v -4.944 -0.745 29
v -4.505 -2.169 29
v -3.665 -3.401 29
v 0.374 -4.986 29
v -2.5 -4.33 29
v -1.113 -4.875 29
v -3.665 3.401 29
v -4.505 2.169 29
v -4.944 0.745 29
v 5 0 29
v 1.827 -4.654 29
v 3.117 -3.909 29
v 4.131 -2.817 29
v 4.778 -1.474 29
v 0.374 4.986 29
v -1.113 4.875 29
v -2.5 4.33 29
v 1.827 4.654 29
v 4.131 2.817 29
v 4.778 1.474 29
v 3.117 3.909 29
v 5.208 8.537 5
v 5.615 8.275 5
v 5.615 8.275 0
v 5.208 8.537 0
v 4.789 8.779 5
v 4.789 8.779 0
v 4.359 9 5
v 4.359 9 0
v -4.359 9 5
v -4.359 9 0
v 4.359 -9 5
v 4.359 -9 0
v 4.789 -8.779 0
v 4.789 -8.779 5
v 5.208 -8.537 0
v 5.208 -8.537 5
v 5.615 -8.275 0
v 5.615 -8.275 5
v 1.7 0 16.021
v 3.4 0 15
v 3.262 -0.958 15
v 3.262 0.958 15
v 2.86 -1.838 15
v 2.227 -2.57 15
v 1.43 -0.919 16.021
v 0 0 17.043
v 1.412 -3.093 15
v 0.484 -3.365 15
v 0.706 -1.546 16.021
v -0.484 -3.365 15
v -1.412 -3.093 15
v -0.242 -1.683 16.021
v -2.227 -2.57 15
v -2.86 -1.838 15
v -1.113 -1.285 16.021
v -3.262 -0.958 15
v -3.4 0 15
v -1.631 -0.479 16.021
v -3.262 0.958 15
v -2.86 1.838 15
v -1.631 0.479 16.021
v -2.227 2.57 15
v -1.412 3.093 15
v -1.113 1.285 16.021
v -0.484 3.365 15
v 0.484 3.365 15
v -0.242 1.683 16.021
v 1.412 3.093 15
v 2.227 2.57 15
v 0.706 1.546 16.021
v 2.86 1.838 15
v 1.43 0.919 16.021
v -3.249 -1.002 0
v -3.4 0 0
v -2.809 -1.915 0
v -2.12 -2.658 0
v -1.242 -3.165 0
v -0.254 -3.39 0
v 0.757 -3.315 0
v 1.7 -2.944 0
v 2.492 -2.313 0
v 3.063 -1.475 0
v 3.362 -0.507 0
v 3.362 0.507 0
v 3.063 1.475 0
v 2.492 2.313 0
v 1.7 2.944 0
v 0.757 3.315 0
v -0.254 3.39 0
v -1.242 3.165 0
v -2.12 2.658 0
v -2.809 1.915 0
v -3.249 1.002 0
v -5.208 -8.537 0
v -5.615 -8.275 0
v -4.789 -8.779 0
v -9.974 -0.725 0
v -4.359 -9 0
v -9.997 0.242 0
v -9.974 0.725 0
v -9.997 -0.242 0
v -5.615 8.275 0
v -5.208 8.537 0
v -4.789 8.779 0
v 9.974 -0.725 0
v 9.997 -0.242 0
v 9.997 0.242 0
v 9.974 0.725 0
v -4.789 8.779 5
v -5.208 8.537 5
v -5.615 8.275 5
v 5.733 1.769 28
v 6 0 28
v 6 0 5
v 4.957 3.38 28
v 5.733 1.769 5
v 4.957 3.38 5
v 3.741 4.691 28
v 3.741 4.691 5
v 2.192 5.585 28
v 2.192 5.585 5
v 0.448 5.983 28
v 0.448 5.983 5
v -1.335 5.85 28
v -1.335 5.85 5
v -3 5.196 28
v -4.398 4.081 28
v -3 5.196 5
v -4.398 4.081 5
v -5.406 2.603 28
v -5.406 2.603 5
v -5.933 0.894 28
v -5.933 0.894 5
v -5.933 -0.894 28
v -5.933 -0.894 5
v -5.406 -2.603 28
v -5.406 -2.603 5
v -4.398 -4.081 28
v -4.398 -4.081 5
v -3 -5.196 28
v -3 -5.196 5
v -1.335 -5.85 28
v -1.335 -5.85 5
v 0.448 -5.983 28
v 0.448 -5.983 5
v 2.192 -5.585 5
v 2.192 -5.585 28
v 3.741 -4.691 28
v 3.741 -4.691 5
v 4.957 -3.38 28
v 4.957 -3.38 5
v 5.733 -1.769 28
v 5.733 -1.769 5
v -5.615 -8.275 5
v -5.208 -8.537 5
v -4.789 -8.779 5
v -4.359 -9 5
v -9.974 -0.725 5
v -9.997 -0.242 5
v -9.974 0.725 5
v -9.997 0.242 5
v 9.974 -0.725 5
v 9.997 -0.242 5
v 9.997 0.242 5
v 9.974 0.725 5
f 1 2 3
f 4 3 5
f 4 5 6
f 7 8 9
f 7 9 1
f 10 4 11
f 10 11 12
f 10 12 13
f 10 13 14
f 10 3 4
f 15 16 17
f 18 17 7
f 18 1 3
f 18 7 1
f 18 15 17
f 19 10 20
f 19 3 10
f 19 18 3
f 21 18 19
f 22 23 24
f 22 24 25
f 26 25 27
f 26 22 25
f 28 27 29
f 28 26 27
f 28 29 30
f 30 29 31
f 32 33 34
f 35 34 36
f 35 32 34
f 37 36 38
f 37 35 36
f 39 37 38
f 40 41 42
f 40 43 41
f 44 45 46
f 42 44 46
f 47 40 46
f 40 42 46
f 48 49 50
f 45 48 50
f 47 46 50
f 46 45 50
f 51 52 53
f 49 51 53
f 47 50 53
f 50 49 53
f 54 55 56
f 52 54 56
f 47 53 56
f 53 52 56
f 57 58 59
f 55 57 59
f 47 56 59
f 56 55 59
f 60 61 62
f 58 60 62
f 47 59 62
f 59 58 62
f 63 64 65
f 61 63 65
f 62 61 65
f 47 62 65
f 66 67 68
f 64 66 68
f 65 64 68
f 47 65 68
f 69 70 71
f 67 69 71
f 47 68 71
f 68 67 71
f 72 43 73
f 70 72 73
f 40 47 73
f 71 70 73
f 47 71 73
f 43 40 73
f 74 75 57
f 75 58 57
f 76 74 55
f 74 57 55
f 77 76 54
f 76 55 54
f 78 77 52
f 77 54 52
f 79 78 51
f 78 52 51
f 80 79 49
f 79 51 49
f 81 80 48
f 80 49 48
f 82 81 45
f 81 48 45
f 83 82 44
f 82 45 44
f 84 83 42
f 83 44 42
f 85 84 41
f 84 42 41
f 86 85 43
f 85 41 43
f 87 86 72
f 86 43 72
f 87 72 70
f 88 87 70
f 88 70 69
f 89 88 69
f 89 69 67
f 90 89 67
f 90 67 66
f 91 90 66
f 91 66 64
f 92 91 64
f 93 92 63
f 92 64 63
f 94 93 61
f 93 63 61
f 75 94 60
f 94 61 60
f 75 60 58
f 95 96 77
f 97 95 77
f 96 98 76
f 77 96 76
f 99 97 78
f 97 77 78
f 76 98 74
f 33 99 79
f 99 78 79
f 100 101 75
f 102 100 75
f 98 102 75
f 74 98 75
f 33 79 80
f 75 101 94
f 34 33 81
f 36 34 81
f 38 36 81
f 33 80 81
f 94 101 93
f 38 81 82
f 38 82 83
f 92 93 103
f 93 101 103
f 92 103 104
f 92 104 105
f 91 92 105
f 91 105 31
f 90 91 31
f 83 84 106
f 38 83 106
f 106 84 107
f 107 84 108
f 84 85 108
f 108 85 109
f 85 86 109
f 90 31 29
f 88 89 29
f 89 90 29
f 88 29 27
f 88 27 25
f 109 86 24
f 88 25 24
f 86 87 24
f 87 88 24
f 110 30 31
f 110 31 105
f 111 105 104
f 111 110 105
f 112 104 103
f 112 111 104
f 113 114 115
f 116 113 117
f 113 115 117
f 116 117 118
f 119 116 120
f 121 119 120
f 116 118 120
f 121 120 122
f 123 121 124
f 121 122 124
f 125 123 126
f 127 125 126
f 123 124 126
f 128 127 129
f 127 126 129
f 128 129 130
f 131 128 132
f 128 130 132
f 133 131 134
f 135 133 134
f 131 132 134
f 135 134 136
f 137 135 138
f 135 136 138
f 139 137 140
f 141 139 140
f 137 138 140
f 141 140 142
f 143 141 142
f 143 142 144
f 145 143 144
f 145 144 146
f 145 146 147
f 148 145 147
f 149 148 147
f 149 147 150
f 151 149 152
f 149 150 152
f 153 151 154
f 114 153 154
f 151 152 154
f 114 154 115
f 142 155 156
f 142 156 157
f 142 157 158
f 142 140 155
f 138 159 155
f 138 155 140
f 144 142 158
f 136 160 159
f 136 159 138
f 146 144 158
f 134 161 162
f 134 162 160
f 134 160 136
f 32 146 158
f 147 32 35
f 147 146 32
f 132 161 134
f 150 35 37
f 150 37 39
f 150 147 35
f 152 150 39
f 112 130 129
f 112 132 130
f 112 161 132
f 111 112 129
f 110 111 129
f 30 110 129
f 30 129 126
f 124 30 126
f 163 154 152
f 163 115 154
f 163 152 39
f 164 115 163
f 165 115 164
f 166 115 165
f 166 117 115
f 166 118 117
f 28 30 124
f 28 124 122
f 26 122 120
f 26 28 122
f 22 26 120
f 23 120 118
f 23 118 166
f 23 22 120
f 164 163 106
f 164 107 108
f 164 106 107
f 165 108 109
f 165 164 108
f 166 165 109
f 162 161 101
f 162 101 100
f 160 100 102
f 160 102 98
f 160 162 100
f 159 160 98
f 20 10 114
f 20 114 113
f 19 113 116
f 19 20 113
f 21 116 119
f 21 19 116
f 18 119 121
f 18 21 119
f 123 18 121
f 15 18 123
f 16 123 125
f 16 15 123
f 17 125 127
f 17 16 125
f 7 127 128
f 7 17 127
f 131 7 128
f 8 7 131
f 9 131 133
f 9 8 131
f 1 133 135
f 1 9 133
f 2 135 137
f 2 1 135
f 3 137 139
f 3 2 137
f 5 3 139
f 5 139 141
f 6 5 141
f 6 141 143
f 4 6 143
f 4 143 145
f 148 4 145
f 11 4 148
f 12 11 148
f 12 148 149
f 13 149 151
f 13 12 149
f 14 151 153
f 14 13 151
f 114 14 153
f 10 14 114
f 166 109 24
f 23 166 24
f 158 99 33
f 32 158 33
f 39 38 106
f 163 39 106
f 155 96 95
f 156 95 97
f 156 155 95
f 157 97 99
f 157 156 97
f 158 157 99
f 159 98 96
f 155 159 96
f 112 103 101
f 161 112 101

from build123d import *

# Parameters (mm, degrees)
EXTRUDE_1_DEPTH     = 5
SKETCH_2_R          = 6
EXTRUDE_2_DEPTH     = 24
M8X1_25_1_D         = 6.8
M8X1_25_1_DEPTH     = 15
M8X1_25_1_TIP       = 2.042926105
SKETCH_5_OUTSIDE_W  = 30.776
SKETCH_5_OUTSIDE_H  = 27.992
SKETCH_5_OUTSIDE_R  = 10
CUT_EXTRUDE_1_DEPTH = 28.658633372
CHAMFER_1_SIZE      = 1


with BuildPart() as part:
    # 草图1 → 凸台-拉伸1 (new body)
    with BuildSketch(Plane.XY):
        Polygon((10.392304845, 0), (5.196152423, 9), (-5.196152423, 9), (-10.392304845, 0), (-5.196152423, -9), (5.196152423, -9), align=None)
    extrude(amount=EXTRUDE_1_DEPTH)

    # 草图2 → 凸台-拉伸2 (add)
    with BuildSketch(Plane.XY.offset(5)):
        Circle(SKETCH_2_R)
    extrude(amount=EXTRUDE_2_DEPTH)

    # M8x1.25 螺纹孔1
    with Locations(Plane(origin=(-3.351254267, -2.461520779, 0), x_dir=(1, 0, 0), z_dir=(0, 0, -1))):
        with Locations((3.351254267, -2.461520779)):
            Hole(M8X1_25_1_D / 2, depth=M8X1_25_1_DEPTH)
            with Locations((0, 0, -(M8X1_25_1_DEPTH + M8X1_25_1_TIP / 2))):  # 118° drill point
                Cone(0, M8X1_25_1_D / 2, M8X1_25_1_TIP, mode=Mode.SUBTRACT)

    # 草图5 outside → 切除-拉伸1 (cut, through all)
    with BuildSketch(Plane.XY.offset(5)):
        Rectangle(SKETCH_5_OUTSIDE_W, SKETCH_5_OUTSIDE_H)
        Circle(SKETCH_5_OUTSIDE_R, mode=Mode.SUBTRACT)
    extrude(amount=-CUT_EXTRUDE_1_DEPTH, mode=Mode.SUBTRACT)

    # 倒角1
    chamfer_1_edges = [part.edges().sort_by_distance(p)[0] for p in [
        (-6, 0, 29),
    ]]
    chamfer(chamfer_1_edges, length=CHAMFER_1_SIZE)


solid = part.part
